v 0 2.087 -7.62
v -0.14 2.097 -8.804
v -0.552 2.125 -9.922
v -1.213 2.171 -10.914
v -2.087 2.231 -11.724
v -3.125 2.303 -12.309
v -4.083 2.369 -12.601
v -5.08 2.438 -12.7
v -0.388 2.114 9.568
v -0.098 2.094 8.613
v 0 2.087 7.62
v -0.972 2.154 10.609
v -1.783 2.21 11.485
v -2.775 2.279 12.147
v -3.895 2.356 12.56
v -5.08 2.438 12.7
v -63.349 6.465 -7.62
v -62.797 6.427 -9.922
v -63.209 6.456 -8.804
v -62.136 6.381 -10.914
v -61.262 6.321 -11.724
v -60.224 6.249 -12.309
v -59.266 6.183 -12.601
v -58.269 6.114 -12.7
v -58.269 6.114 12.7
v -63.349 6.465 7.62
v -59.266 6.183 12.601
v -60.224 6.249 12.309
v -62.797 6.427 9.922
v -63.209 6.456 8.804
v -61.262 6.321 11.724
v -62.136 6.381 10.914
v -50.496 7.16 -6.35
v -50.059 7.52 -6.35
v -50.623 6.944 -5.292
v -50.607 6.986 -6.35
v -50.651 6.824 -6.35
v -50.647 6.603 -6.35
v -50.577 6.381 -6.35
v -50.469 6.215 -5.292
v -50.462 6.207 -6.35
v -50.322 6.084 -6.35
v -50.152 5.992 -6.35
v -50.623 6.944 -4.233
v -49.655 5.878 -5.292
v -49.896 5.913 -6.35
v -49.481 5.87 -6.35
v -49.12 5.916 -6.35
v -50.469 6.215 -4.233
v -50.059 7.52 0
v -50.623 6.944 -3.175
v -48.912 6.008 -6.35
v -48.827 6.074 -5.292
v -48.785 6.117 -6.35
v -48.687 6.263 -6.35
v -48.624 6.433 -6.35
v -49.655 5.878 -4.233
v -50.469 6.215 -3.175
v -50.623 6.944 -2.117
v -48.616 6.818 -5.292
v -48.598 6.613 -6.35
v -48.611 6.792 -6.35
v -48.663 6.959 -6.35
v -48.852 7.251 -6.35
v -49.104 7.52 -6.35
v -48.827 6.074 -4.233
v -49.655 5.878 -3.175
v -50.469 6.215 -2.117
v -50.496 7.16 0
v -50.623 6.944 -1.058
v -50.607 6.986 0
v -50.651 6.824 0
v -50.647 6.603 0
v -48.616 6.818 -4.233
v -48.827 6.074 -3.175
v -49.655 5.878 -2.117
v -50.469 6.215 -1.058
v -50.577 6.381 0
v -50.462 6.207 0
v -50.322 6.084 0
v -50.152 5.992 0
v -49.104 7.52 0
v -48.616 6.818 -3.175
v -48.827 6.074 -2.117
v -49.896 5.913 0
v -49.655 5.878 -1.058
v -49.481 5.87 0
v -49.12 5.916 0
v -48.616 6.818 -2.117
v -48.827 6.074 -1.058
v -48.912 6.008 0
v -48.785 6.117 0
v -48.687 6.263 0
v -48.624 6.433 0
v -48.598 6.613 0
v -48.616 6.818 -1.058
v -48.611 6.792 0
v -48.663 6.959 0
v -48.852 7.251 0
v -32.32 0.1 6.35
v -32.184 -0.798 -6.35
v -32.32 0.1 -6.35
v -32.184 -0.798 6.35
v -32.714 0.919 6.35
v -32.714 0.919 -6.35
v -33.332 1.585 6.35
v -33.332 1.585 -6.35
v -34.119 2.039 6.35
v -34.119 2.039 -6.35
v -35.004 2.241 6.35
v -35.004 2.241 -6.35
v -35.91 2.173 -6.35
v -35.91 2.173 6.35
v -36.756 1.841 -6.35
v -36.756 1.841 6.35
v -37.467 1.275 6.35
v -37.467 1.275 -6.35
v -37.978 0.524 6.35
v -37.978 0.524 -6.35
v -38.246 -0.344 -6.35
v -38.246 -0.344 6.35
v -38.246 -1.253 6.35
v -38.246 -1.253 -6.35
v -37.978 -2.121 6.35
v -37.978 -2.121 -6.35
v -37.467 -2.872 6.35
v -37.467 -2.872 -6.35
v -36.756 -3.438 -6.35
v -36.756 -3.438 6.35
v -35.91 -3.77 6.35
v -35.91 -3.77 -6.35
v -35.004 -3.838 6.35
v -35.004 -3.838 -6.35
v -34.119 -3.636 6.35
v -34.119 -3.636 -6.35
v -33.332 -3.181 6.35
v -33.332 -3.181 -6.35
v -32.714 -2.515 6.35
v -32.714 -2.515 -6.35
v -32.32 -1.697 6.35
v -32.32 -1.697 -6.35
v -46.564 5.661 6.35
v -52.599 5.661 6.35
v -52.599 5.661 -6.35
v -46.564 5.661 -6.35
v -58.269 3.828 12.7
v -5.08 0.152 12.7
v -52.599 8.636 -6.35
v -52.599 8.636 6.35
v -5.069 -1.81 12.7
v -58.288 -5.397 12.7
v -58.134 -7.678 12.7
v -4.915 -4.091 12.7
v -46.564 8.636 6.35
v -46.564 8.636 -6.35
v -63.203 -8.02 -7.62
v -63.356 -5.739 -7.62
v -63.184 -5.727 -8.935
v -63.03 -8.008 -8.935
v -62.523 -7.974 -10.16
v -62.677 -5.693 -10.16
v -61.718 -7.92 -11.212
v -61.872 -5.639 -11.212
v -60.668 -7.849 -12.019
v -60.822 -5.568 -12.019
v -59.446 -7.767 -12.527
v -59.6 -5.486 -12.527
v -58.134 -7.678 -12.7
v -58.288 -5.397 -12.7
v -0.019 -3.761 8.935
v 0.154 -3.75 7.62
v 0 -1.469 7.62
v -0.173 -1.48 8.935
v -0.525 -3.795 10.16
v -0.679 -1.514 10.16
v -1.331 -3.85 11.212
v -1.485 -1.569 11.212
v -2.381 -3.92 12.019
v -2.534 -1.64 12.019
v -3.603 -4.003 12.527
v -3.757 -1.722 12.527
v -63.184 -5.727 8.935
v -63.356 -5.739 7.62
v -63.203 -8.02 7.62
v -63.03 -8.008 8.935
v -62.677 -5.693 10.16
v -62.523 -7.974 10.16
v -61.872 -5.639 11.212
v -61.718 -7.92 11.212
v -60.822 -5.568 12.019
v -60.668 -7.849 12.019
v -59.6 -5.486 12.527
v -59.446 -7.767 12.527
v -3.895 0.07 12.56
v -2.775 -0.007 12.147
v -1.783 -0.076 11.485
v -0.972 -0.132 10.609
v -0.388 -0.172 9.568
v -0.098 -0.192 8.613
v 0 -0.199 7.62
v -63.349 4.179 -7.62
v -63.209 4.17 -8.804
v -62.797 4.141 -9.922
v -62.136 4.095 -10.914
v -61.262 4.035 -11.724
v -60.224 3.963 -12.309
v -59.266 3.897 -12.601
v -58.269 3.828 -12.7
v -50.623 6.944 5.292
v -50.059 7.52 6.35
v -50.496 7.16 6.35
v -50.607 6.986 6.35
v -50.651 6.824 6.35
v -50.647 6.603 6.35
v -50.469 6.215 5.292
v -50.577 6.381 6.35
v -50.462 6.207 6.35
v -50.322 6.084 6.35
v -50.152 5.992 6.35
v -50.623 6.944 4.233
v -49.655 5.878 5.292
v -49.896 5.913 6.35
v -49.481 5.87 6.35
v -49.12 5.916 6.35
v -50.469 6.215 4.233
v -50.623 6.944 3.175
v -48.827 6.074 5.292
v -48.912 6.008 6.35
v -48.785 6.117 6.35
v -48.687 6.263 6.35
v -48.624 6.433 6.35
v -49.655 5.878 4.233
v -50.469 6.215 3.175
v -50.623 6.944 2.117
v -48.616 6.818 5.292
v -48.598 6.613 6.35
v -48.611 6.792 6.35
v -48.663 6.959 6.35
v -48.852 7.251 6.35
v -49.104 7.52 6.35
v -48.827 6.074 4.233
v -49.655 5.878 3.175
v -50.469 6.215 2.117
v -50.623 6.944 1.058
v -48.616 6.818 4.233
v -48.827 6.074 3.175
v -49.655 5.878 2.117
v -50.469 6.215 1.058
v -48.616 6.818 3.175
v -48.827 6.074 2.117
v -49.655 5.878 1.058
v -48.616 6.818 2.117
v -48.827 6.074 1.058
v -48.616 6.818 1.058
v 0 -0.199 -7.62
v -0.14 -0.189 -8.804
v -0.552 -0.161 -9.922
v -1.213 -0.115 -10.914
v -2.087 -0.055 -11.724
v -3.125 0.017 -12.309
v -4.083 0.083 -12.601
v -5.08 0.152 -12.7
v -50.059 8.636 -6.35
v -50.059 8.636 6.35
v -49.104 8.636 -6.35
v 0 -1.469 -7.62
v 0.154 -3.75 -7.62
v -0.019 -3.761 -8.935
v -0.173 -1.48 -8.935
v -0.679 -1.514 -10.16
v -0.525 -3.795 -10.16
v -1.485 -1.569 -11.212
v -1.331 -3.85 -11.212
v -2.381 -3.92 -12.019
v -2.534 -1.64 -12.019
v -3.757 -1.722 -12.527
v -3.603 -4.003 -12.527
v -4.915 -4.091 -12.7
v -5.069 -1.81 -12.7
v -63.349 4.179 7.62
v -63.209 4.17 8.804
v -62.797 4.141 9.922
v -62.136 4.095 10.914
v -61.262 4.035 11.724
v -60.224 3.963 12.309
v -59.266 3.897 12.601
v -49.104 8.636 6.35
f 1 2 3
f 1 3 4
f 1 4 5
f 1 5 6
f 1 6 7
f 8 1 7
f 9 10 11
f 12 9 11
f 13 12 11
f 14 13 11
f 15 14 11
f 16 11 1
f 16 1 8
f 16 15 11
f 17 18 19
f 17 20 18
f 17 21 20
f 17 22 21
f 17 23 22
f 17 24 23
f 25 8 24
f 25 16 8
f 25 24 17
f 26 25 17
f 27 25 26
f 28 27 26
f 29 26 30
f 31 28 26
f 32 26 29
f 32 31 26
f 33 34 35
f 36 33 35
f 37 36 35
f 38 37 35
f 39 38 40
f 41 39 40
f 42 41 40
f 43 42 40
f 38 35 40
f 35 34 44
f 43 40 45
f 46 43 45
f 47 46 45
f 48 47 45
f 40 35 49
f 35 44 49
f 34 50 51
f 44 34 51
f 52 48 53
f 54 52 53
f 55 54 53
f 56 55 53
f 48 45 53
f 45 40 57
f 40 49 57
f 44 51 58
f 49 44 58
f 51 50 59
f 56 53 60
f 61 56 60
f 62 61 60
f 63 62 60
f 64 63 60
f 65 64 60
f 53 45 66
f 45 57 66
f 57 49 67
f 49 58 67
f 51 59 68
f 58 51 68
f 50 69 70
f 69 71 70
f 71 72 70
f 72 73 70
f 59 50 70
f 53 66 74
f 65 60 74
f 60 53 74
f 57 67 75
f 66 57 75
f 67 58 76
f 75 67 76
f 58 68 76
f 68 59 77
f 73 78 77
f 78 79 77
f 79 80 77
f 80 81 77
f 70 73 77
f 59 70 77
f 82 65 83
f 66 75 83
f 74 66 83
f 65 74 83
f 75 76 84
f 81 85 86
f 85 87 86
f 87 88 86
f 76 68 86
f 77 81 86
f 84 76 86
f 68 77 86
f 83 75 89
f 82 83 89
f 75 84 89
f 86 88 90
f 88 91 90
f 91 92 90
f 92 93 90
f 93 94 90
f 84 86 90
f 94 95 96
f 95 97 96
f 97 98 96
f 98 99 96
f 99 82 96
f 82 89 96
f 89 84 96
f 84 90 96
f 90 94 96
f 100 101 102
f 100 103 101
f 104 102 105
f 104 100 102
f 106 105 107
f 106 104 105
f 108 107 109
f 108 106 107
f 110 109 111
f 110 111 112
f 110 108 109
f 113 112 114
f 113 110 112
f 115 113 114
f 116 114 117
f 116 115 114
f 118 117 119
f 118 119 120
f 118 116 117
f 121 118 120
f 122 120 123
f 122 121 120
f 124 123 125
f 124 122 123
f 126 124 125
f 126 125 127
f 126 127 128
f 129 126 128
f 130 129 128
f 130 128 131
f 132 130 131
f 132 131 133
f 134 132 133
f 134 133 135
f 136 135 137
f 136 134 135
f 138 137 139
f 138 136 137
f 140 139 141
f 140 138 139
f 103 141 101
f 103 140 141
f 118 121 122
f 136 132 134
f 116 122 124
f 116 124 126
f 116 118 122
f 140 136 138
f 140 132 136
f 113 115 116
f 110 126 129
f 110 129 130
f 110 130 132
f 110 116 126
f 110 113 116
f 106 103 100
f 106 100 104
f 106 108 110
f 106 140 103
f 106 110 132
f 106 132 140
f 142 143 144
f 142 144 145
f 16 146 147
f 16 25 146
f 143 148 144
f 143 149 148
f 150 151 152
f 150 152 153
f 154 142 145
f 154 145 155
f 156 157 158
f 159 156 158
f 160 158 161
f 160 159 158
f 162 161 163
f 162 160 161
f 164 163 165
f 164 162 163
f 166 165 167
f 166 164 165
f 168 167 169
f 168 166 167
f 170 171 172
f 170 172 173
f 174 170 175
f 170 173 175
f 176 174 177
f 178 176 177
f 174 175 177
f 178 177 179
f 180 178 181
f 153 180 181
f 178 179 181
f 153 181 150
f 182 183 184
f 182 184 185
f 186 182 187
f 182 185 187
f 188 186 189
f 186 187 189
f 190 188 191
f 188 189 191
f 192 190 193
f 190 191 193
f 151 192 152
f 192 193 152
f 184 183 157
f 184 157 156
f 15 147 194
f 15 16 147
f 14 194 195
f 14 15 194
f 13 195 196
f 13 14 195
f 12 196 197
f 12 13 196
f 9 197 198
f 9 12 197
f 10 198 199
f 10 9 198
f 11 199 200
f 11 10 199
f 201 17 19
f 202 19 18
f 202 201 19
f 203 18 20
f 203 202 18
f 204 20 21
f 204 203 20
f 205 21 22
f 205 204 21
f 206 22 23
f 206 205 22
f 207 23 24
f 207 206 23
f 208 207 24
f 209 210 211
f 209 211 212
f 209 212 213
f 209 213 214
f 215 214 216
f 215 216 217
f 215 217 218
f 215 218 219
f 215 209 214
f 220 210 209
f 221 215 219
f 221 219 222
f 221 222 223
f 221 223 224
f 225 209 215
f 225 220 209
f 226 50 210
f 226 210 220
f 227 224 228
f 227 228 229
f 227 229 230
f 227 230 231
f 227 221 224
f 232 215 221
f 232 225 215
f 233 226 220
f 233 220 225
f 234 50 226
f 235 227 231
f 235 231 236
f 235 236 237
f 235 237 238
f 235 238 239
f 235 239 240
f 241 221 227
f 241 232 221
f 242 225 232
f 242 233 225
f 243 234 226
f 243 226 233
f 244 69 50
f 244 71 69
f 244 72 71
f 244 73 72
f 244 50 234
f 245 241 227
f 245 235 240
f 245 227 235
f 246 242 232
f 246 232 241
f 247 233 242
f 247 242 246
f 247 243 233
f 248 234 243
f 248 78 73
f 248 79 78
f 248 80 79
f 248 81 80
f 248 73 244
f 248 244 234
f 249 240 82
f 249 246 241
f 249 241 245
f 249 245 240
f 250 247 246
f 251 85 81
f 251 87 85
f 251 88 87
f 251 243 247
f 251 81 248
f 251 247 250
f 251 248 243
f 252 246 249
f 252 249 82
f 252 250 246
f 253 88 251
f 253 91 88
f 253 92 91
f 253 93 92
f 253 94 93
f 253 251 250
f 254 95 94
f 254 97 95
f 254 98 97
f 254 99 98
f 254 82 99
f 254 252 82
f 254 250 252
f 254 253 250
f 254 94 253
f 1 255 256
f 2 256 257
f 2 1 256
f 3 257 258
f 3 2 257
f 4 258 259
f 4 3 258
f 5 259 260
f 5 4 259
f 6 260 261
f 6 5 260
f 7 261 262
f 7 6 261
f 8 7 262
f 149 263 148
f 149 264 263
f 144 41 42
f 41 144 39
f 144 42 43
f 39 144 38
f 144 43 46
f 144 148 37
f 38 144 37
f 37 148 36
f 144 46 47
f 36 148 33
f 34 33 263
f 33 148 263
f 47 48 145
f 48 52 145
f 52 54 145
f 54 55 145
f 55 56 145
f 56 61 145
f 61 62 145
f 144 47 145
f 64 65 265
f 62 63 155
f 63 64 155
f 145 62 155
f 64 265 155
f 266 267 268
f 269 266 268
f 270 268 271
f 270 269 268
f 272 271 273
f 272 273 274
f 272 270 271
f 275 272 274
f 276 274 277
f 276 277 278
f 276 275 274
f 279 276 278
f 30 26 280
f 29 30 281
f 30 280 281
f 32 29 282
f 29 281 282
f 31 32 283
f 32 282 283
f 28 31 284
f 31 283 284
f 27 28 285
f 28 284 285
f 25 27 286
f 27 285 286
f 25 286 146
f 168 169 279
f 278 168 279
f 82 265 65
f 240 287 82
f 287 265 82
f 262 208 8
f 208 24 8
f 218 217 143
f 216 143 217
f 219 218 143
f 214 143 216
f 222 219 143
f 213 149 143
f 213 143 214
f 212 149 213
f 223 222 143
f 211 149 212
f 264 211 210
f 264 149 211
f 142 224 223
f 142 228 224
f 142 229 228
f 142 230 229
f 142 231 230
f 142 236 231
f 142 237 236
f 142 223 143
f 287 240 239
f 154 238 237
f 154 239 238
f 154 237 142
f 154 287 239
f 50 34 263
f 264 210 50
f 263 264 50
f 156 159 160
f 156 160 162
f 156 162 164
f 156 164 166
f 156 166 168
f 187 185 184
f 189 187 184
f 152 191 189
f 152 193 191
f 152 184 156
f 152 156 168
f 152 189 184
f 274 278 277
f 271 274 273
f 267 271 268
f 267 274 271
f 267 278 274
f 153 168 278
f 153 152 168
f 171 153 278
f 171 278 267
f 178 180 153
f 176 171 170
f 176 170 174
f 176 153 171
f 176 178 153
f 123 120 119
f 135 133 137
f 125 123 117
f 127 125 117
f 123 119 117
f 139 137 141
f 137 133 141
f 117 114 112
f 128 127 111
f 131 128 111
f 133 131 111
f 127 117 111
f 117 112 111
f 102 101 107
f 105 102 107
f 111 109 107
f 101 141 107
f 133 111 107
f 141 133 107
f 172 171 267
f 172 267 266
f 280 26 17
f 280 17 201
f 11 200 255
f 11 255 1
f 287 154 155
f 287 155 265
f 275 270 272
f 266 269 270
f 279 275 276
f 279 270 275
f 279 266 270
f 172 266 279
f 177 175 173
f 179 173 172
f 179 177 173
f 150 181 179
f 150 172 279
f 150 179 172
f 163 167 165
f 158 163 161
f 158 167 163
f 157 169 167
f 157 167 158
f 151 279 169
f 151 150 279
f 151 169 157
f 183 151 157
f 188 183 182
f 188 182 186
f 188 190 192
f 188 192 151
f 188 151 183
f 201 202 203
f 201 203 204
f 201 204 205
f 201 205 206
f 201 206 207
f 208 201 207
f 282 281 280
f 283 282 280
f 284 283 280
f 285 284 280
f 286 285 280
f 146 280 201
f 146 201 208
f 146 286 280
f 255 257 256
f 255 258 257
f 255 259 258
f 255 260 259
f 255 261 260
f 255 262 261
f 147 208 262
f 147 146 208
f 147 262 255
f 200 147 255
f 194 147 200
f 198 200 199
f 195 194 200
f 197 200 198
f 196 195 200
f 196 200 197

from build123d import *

# Parameters (mm, degrees)
F1_DEPTH = 12.7
F2_R     = 3.048
F3_DEPTH = 6.35
F4_R     = 5.08
F4_2_R   = 5.08


with BuildPart() as f1:
    # F0 (on Top) → F1 (new body, symmetric)
    with BuildSketch(Plane.XY):
        Polygon((-63.3489005822, 4.1792615378), (0, -0.1987283007), (0, 2.0872716993), (-63.3489005822, 6.4652615378), align=None)
    extrude(amount=F1_DEPTH, both=True)

    # F4
    f4_edges = [f1.edges().sort_by_distance(p)[0] for p in [
        (0, 0.944272, 12.7),
        (0, 0.944272, -12.7),
        (-63.348901, 5.322262, 12.7),
        (-63.348901, 5.322262, -12.7),
    ]]
    fillet(f4_edges, radius=F4_R)


with BuildPart() as f1b:
    # F0 (on Top) → F1, piece 2 (new body, symmetric)
    with BuildSketch(Plane.XY):
        Polygon((0.1537269254, -3.749553597), (0, -1.4687283007), (-63.3562582316, -5.7389206721), (-63.2025313062, -8.0197459685), align=None)
    extrude(amount=F1_DEPTH, both=True)

    # F4#2
    f4_2_edges = [f1b.edges().sort_by_distance(p)[0] for p in [
        (0.076863, -2.609141, 12.7),
        (0.076863, -2.609141, -12.7),
        (-63.279395, -6.879333, 12.7),
        (-63.279395, -6.879333, -12.7),
    ]]
    fillet(f4_2_edges, radius=F4_2_R)


with BuildPart() as f3:
    # F2 (on Top) → F3 (new body, symmetric)
    with BuildSketch(Plane.XY):
        with Locations((-35.2321863174, -0.7984223776)):
            Circle(F2_R)
    extrude(amount=F3_DEPTH, both=True)


with BuildPart() as f3b:
    # F2 (on Top) → F3, piece 2 (new body, symmetric)
    with BuildSketch(Plane.XY):
        with BuildLine():
            Line((-52.5990128517, 8.6360052228), (-52.5990128517, 5.6607332081))
            Line((-52.5990128517, 5.6607332081), (-46.5642656517, 5.6607332081))
            Line((-46.5642656517, 5.6607332081), (-46.5642656517, 8.6360052228))
            Line((-46.5642656517, 8.6360052228), (-49.1042656517, 8.6360052228))
            Line((-49.1042656517, 8.6360052228), (-49.1042656517, 7.5197662227))
            add(Edge.make_bspline(
                [(-50.0590128517, 7.5197662227), (-50.2991710754, 7.3525333206), (-50.7703997584, 7.0243957328), (-50.5695007818, 6.0865020248), (-49.6663013324, 5.8120882742), (-48.7216894107, 5.92591807), (-48.474219616, 6.8851035433), (-48.8907623894, 7.3046985215), (-49.1042656517, 7.5197662227)],
                knots=[0, 0, 0, 0, 0.1654287466, 0.3245975474, 0.4975700997, 0.6675808428, 0.8296151582, 1, 1, 1, 1], degree=3))
            Line((-50.0590128517, 7.5197662227), (-50.0590128517, 8.6360052228))
            Line((-50.0590128517, 8.6360052228), (-52.5990128517, 8.6360052228))
        make_face()
    extrude(amount=F3_DEPTH, both=True)


solid = Compound([f1.part, f1b.part, f3.part, f3b.part])
